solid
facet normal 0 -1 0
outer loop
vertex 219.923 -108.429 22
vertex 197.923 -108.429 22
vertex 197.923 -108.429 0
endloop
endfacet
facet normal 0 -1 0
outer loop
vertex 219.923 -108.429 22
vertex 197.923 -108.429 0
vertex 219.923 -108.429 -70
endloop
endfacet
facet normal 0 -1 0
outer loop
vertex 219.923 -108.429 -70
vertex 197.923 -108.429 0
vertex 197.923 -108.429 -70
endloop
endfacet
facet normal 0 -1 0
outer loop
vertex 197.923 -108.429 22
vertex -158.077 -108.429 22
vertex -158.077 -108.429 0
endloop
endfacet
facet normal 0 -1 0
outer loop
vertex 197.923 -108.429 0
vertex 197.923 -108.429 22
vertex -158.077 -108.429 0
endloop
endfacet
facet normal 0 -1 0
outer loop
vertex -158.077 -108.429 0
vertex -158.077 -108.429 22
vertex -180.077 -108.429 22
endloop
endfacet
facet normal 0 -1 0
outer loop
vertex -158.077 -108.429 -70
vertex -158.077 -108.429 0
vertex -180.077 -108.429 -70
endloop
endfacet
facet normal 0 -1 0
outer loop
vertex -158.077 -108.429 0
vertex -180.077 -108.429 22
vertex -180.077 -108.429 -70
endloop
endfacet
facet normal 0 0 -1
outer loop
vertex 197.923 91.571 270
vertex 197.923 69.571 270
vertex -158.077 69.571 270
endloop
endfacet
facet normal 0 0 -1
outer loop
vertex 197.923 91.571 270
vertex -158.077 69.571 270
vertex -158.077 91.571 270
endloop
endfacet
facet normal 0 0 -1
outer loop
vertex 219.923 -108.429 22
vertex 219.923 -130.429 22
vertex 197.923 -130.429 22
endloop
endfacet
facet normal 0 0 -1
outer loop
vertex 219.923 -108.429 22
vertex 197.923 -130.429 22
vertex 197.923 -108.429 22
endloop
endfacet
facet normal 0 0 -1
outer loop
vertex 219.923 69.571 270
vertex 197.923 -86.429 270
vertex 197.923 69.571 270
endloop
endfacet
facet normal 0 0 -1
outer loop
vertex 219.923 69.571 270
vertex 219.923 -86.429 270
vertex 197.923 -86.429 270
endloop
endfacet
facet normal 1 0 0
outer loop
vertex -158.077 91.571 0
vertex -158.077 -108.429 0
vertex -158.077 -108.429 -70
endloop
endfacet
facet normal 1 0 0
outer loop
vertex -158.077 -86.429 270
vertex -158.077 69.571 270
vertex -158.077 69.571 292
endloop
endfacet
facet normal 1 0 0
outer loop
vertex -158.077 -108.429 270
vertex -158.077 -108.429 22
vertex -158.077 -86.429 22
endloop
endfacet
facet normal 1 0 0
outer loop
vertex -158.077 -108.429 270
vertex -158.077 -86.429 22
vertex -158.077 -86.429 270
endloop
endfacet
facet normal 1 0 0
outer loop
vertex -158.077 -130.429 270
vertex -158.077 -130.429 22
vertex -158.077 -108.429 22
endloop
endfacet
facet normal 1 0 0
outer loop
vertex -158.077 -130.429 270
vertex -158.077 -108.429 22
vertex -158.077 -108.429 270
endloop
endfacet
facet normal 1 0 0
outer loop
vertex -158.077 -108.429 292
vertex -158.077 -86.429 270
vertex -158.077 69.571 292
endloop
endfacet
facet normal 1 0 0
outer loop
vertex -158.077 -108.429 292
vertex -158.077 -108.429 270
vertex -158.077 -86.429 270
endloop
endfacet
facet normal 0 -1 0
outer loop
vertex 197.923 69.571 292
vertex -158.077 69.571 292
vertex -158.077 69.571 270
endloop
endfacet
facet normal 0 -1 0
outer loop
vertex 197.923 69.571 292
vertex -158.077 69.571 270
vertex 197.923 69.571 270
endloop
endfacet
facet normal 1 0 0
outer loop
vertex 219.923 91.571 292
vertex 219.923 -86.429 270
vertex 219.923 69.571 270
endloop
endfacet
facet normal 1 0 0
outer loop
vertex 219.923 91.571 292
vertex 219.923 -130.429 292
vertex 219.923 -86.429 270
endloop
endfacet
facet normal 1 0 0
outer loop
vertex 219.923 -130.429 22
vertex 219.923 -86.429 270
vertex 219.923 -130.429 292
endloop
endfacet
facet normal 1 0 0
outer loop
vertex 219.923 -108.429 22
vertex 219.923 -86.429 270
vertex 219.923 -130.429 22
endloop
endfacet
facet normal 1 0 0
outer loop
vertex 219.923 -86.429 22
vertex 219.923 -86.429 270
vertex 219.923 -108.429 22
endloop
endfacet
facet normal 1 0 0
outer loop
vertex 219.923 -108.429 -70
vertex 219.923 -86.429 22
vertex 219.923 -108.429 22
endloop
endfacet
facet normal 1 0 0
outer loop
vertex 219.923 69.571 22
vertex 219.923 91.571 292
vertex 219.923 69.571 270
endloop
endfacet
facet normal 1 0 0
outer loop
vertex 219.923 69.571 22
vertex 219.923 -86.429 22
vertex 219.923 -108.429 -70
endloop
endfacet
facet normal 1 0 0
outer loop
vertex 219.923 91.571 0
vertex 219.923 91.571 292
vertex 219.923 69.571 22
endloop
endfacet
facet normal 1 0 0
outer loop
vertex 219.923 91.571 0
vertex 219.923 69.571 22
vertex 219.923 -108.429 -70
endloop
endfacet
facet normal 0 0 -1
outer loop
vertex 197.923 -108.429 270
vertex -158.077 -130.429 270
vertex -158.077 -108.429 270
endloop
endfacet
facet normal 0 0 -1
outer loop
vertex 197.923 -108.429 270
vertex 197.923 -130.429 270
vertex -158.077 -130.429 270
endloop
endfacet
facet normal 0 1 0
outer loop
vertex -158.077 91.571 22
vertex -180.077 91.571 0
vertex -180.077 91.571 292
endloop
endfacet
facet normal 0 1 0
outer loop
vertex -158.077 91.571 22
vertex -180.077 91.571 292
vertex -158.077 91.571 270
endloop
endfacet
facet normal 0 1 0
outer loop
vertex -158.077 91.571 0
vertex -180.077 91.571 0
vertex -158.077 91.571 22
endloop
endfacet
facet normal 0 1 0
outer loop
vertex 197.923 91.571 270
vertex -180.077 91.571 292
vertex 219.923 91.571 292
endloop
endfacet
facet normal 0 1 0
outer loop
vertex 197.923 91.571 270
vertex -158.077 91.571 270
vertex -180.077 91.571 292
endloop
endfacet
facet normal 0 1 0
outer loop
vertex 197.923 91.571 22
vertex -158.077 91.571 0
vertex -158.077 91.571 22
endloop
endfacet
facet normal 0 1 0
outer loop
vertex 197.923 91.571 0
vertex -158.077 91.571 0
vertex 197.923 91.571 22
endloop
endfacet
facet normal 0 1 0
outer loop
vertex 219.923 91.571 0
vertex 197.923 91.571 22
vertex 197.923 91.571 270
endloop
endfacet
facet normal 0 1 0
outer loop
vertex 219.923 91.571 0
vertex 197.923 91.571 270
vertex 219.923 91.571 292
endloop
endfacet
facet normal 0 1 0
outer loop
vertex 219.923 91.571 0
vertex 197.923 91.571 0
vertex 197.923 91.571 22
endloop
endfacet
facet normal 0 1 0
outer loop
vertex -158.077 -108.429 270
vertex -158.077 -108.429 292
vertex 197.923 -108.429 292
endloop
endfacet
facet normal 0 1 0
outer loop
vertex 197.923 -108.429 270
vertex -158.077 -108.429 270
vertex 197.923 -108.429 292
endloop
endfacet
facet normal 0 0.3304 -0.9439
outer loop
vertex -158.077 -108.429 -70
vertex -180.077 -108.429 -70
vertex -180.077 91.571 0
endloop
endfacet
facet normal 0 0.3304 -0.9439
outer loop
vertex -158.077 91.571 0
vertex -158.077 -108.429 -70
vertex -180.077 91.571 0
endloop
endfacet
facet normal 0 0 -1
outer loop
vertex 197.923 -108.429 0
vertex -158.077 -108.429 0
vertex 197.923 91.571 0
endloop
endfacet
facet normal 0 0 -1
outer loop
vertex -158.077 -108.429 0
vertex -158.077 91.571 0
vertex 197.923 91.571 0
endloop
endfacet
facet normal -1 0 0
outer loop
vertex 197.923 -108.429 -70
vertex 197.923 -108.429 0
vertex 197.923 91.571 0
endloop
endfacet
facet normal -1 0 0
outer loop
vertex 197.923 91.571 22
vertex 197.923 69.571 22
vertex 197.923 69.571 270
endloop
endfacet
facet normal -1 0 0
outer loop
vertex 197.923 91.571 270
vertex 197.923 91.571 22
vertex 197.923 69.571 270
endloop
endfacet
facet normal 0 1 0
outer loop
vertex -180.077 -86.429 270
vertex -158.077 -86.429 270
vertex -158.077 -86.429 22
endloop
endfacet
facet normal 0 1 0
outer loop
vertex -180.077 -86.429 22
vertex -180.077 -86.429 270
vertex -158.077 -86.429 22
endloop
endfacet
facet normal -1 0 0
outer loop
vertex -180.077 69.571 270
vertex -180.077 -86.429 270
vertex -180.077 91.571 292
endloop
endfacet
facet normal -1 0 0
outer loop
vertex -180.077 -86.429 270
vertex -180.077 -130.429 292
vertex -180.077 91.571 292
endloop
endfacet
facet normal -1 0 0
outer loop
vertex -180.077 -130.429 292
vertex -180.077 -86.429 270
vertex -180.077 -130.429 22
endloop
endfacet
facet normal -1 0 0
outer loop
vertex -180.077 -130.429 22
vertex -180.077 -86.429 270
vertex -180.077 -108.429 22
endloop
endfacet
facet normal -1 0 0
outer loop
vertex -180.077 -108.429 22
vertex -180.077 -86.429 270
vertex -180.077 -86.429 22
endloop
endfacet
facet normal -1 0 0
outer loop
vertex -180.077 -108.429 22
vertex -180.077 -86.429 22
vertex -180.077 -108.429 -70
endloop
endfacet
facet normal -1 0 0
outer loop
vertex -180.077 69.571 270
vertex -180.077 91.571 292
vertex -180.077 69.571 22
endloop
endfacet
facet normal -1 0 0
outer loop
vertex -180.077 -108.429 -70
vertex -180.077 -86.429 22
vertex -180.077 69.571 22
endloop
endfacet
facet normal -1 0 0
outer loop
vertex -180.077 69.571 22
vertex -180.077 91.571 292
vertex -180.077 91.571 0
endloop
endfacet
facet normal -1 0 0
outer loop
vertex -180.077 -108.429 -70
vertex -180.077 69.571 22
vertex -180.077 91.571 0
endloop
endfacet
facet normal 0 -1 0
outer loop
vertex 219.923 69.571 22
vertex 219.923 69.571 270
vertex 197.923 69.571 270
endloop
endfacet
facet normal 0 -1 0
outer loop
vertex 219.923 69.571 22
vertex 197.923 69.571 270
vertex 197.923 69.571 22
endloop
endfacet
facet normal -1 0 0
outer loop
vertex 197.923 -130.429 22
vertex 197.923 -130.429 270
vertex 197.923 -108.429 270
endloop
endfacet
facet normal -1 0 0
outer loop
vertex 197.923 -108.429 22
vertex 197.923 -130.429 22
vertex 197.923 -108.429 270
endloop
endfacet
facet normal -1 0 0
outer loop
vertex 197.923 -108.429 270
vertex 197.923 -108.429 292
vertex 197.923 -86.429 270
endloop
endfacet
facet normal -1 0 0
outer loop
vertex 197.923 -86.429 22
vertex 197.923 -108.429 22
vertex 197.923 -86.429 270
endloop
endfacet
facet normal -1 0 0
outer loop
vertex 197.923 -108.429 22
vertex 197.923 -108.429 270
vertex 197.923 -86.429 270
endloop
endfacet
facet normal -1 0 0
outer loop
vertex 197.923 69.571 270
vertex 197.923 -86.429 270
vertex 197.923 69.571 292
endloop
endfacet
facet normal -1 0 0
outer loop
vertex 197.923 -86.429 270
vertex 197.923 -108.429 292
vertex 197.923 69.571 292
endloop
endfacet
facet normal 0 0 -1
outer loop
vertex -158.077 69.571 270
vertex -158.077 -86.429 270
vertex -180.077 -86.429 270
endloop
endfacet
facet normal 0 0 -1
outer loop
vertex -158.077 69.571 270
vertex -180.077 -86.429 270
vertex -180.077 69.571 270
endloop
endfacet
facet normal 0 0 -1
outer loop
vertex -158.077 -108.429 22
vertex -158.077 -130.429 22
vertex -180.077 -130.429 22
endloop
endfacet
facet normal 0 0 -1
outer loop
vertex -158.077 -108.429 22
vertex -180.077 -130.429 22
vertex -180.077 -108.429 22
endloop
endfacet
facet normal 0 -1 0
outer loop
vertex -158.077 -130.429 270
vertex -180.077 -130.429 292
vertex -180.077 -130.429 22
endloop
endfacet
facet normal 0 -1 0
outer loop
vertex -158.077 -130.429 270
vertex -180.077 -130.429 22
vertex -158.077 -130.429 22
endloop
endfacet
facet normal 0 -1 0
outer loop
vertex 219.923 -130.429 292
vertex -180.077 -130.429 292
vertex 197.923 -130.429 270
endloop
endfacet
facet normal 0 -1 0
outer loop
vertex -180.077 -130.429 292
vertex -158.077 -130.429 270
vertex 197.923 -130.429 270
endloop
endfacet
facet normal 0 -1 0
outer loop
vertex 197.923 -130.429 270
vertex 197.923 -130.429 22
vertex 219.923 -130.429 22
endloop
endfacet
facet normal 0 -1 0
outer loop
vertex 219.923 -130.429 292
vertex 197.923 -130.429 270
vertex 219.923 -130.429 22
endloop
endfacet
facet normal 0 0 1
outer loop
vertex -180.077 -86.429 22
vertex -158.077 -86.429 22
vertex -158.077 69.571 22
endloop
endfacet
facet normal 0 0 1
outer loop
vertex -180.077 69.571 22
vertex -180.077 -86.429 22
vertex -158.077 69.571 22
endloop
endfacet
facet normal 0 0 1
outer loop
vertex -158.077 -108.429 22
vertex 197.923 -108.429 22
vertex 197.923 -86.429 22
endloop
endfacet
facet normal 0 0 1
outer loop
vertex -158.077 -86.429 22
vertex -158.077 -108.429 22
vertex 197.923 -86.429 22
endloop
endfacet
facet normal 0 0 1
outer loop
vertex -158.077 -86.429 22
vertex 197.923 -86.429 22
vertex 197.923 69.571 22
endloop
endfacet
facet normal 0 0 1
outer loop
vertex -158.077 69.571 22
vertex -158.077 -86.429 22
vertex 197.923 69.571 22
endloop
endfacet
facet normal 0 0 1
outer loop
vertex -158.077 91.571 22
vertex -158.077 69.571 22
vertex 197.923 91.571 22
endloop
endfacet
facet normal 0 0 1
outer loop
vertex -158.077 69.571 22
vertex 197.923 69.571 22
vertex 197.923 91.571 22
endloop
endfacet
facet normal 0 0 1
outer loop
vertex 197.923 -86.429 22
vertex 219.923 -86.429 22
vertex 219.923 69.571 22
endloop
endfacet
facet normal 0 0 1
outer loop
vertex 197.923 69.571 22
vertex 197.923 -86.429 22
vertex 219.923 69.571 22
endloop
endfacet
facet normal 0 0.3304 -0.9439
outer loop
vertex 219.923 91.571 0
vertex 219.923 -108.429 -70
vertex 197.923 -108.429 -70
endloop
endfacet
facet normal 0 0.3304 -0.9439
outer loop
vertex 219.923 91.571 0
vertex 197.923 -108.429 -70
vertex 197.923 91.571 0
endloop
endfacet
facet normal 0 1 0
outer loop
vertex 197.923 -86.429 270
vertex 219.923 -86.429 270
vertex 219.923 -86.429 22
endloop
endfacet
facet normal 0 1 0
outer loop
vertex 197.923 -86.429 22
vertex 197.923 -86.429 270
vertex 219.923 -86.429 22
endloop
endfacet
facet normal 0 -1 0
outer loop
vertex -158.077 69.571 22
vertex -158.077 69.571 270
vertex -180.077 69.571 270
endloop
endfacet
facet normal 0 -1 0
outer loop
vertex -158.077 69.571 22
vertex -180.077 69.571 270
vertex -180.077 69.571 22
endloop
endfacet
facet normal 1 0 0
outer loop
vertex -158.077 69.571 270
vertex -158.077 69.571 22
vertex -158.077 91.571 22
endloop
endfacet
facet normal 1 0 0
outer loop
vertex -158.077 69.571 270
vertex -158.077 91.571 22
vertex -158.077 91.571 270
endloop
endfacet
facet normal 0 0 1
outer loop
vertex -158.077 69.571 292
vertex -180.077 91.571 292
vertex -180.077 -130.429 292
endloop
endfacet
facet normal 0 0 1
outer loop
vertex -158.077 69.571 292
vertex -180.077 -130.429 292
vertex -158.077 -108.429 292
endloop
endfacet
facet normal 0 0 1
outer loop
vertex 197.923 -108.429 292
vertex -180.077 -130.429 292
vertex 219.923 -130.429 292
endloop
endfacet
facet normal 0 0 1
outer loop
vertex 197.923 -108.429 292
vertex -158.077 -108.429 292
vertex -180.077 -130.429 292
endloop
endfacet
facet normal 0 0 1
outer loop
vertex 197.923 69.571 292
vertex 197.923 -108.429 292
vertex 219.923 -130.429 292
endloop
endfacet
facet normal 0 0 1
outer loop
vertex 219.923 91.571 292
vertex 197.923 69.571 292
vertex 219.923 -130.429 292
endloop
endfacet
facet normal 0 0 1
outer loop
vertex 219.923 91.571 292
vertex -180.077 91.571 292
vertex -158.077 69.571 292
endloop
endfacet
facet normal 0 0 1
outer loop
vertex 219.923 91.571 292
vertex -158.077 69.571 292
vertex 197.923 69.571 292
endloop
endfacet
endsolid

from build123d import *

# Parameters (mm, degrees)
ESQUISSE1_W             = 400
ESQUISSE1_H             = 222
BOSS_EXTRU_1_DEPTH      = 292
ESQUISSE2_W             = 356
ESQUISSE2_H             = 270
ENL_V_MAT_EXTRU_1_DEPTH = 428.684801456
ESQUISSE8_W             = 270
ESQUISSE8_H             = 156
ENL_V_MAT_EXTRU_2_DEPTH = 513.128650853
ESQUISSE9_W             = 356
ESQUISSE9_H             = 178
ENL_V_MAT_EXTRU_3_DEPTH = 389.126325339
ESQUISSE10_W            = 22
ESQUISSE10_H            = 22
ENL_V_MAT_EXTRU_4_DEPTH = 400
ESQUISSE11_W            = 22
ESQUISSE11_H            = 200
BOSS_EXTRU_2_DEPTH      = 400
BOSS_EXTRU_3_DEPTH      = 22
BOSS_EXTRU_4_DEPTH      = 22


with BuildPart() as part:
    # Esquisse1 → Boss.-Extru.1 (new body)
    with BuildSketch(Plane.XY):
        with Locations((19.923371648, -19.429118774)):
            Rectangle(ESQUISSE1_W, ESQUISSE1_H)
    extrude(amount=BOSS_EXTRU_1_DEPTH)

    # Esquisse2 → Enlèv. mat.-Extru.1 (cut, through all)
    with BuildSketch(Plane.XZ.offset(130.429118774)):
        with Locations((19.923371648, 135)):
            Rectangle(ESQUISSE2_W, ESQUISSE2_H)
    extrude(amount=-ENL_V_MAT_EXTRU_1_DEPTH, mode=Mode.SUBTRACT)

    # Esquisse8 → Enlèv. mat.-Extru.2 (cut, through all)
    with BuildSketch(Plane(origin=(219.923371648, 0, 0), x_dir=(0, 0, -1), z_dir=(1, 0, 0))):
        with Locations((-135, -8.429118774)):
            Rectangle(ESQUISSE8_W, ESQUISSE8_H)
    extrude(amount=-ENL_V_MAT_EXTRU_2_DEPTH, mode=Mode.SUBTRACT)

    # Esquisse9 → Enlèv. mat.-Extru.3 (cut, through all)
    with BuildSketch(Plane.XY.offset(292)):
        with Locations((19.923371648, -19.429118774)):
            Rectangle(ESQUISSE9_W, ESQUISSE9_H)
    extrude(amount=-ENL_V_MAT_EXTRU_3_DEPTH, mode=Mode.SUBTRACT)

    # Esquisse10 → Enlèv. mat.-Extru.4 (cut)
    with BuildSketch(Plane(origin=(219.923371648, 0, 0), x_dir=(0, 0, -1), z_dir=(1, 0, 0))):
        with Locations((-11, -119.429118774)):
            Rectangle(ESQUISSE10_W, ESQUISSE10_H)
    extrude(amount=-ENL_V_MAT_EXTRU_4_DEPTH, mode=Mode.SUBTRACT)

    # Esquisse11 → Boss.-Extru.2 (add)
    with BuildSketch(Plane(origin=(219.923371648, 0, 0), x_dir=(0, 0, -1), z_dir=(1, 0, 0))):
        with Locations((-11, -8.429118774)):
            Rectangle(ESQUISSE11_W, ESQUISSE11_H)
    extrude(amount=-BOSS_EXTRU_2_DEPTH)

    # Esquisse12 → Boss.-Extru.3 (add)
    with BuildSketch(Plane(origin=(219.923371648, 0, 0), x_dir=(0, 0, -1), z_dir=(1, 0, 0))):
        Polygon((70, -108.429118774), (0, 91.570881226), (0, -108.429118774), align=None)
    extrude(amount=-BOSS_EXTRU_3_DEPTH)

    # Esquisse13 → Boss.-Extru.4 (add)
    with BuildSketch(Plane.ZY.offset(180.076628352)):
        Polygon((0, -108.429118774), (-70, -108.429118774), (0, 91.570881226), align=None)
    extrude(amount=-BOSS_EXTRU_4_DEPTH)


solid = part.part
